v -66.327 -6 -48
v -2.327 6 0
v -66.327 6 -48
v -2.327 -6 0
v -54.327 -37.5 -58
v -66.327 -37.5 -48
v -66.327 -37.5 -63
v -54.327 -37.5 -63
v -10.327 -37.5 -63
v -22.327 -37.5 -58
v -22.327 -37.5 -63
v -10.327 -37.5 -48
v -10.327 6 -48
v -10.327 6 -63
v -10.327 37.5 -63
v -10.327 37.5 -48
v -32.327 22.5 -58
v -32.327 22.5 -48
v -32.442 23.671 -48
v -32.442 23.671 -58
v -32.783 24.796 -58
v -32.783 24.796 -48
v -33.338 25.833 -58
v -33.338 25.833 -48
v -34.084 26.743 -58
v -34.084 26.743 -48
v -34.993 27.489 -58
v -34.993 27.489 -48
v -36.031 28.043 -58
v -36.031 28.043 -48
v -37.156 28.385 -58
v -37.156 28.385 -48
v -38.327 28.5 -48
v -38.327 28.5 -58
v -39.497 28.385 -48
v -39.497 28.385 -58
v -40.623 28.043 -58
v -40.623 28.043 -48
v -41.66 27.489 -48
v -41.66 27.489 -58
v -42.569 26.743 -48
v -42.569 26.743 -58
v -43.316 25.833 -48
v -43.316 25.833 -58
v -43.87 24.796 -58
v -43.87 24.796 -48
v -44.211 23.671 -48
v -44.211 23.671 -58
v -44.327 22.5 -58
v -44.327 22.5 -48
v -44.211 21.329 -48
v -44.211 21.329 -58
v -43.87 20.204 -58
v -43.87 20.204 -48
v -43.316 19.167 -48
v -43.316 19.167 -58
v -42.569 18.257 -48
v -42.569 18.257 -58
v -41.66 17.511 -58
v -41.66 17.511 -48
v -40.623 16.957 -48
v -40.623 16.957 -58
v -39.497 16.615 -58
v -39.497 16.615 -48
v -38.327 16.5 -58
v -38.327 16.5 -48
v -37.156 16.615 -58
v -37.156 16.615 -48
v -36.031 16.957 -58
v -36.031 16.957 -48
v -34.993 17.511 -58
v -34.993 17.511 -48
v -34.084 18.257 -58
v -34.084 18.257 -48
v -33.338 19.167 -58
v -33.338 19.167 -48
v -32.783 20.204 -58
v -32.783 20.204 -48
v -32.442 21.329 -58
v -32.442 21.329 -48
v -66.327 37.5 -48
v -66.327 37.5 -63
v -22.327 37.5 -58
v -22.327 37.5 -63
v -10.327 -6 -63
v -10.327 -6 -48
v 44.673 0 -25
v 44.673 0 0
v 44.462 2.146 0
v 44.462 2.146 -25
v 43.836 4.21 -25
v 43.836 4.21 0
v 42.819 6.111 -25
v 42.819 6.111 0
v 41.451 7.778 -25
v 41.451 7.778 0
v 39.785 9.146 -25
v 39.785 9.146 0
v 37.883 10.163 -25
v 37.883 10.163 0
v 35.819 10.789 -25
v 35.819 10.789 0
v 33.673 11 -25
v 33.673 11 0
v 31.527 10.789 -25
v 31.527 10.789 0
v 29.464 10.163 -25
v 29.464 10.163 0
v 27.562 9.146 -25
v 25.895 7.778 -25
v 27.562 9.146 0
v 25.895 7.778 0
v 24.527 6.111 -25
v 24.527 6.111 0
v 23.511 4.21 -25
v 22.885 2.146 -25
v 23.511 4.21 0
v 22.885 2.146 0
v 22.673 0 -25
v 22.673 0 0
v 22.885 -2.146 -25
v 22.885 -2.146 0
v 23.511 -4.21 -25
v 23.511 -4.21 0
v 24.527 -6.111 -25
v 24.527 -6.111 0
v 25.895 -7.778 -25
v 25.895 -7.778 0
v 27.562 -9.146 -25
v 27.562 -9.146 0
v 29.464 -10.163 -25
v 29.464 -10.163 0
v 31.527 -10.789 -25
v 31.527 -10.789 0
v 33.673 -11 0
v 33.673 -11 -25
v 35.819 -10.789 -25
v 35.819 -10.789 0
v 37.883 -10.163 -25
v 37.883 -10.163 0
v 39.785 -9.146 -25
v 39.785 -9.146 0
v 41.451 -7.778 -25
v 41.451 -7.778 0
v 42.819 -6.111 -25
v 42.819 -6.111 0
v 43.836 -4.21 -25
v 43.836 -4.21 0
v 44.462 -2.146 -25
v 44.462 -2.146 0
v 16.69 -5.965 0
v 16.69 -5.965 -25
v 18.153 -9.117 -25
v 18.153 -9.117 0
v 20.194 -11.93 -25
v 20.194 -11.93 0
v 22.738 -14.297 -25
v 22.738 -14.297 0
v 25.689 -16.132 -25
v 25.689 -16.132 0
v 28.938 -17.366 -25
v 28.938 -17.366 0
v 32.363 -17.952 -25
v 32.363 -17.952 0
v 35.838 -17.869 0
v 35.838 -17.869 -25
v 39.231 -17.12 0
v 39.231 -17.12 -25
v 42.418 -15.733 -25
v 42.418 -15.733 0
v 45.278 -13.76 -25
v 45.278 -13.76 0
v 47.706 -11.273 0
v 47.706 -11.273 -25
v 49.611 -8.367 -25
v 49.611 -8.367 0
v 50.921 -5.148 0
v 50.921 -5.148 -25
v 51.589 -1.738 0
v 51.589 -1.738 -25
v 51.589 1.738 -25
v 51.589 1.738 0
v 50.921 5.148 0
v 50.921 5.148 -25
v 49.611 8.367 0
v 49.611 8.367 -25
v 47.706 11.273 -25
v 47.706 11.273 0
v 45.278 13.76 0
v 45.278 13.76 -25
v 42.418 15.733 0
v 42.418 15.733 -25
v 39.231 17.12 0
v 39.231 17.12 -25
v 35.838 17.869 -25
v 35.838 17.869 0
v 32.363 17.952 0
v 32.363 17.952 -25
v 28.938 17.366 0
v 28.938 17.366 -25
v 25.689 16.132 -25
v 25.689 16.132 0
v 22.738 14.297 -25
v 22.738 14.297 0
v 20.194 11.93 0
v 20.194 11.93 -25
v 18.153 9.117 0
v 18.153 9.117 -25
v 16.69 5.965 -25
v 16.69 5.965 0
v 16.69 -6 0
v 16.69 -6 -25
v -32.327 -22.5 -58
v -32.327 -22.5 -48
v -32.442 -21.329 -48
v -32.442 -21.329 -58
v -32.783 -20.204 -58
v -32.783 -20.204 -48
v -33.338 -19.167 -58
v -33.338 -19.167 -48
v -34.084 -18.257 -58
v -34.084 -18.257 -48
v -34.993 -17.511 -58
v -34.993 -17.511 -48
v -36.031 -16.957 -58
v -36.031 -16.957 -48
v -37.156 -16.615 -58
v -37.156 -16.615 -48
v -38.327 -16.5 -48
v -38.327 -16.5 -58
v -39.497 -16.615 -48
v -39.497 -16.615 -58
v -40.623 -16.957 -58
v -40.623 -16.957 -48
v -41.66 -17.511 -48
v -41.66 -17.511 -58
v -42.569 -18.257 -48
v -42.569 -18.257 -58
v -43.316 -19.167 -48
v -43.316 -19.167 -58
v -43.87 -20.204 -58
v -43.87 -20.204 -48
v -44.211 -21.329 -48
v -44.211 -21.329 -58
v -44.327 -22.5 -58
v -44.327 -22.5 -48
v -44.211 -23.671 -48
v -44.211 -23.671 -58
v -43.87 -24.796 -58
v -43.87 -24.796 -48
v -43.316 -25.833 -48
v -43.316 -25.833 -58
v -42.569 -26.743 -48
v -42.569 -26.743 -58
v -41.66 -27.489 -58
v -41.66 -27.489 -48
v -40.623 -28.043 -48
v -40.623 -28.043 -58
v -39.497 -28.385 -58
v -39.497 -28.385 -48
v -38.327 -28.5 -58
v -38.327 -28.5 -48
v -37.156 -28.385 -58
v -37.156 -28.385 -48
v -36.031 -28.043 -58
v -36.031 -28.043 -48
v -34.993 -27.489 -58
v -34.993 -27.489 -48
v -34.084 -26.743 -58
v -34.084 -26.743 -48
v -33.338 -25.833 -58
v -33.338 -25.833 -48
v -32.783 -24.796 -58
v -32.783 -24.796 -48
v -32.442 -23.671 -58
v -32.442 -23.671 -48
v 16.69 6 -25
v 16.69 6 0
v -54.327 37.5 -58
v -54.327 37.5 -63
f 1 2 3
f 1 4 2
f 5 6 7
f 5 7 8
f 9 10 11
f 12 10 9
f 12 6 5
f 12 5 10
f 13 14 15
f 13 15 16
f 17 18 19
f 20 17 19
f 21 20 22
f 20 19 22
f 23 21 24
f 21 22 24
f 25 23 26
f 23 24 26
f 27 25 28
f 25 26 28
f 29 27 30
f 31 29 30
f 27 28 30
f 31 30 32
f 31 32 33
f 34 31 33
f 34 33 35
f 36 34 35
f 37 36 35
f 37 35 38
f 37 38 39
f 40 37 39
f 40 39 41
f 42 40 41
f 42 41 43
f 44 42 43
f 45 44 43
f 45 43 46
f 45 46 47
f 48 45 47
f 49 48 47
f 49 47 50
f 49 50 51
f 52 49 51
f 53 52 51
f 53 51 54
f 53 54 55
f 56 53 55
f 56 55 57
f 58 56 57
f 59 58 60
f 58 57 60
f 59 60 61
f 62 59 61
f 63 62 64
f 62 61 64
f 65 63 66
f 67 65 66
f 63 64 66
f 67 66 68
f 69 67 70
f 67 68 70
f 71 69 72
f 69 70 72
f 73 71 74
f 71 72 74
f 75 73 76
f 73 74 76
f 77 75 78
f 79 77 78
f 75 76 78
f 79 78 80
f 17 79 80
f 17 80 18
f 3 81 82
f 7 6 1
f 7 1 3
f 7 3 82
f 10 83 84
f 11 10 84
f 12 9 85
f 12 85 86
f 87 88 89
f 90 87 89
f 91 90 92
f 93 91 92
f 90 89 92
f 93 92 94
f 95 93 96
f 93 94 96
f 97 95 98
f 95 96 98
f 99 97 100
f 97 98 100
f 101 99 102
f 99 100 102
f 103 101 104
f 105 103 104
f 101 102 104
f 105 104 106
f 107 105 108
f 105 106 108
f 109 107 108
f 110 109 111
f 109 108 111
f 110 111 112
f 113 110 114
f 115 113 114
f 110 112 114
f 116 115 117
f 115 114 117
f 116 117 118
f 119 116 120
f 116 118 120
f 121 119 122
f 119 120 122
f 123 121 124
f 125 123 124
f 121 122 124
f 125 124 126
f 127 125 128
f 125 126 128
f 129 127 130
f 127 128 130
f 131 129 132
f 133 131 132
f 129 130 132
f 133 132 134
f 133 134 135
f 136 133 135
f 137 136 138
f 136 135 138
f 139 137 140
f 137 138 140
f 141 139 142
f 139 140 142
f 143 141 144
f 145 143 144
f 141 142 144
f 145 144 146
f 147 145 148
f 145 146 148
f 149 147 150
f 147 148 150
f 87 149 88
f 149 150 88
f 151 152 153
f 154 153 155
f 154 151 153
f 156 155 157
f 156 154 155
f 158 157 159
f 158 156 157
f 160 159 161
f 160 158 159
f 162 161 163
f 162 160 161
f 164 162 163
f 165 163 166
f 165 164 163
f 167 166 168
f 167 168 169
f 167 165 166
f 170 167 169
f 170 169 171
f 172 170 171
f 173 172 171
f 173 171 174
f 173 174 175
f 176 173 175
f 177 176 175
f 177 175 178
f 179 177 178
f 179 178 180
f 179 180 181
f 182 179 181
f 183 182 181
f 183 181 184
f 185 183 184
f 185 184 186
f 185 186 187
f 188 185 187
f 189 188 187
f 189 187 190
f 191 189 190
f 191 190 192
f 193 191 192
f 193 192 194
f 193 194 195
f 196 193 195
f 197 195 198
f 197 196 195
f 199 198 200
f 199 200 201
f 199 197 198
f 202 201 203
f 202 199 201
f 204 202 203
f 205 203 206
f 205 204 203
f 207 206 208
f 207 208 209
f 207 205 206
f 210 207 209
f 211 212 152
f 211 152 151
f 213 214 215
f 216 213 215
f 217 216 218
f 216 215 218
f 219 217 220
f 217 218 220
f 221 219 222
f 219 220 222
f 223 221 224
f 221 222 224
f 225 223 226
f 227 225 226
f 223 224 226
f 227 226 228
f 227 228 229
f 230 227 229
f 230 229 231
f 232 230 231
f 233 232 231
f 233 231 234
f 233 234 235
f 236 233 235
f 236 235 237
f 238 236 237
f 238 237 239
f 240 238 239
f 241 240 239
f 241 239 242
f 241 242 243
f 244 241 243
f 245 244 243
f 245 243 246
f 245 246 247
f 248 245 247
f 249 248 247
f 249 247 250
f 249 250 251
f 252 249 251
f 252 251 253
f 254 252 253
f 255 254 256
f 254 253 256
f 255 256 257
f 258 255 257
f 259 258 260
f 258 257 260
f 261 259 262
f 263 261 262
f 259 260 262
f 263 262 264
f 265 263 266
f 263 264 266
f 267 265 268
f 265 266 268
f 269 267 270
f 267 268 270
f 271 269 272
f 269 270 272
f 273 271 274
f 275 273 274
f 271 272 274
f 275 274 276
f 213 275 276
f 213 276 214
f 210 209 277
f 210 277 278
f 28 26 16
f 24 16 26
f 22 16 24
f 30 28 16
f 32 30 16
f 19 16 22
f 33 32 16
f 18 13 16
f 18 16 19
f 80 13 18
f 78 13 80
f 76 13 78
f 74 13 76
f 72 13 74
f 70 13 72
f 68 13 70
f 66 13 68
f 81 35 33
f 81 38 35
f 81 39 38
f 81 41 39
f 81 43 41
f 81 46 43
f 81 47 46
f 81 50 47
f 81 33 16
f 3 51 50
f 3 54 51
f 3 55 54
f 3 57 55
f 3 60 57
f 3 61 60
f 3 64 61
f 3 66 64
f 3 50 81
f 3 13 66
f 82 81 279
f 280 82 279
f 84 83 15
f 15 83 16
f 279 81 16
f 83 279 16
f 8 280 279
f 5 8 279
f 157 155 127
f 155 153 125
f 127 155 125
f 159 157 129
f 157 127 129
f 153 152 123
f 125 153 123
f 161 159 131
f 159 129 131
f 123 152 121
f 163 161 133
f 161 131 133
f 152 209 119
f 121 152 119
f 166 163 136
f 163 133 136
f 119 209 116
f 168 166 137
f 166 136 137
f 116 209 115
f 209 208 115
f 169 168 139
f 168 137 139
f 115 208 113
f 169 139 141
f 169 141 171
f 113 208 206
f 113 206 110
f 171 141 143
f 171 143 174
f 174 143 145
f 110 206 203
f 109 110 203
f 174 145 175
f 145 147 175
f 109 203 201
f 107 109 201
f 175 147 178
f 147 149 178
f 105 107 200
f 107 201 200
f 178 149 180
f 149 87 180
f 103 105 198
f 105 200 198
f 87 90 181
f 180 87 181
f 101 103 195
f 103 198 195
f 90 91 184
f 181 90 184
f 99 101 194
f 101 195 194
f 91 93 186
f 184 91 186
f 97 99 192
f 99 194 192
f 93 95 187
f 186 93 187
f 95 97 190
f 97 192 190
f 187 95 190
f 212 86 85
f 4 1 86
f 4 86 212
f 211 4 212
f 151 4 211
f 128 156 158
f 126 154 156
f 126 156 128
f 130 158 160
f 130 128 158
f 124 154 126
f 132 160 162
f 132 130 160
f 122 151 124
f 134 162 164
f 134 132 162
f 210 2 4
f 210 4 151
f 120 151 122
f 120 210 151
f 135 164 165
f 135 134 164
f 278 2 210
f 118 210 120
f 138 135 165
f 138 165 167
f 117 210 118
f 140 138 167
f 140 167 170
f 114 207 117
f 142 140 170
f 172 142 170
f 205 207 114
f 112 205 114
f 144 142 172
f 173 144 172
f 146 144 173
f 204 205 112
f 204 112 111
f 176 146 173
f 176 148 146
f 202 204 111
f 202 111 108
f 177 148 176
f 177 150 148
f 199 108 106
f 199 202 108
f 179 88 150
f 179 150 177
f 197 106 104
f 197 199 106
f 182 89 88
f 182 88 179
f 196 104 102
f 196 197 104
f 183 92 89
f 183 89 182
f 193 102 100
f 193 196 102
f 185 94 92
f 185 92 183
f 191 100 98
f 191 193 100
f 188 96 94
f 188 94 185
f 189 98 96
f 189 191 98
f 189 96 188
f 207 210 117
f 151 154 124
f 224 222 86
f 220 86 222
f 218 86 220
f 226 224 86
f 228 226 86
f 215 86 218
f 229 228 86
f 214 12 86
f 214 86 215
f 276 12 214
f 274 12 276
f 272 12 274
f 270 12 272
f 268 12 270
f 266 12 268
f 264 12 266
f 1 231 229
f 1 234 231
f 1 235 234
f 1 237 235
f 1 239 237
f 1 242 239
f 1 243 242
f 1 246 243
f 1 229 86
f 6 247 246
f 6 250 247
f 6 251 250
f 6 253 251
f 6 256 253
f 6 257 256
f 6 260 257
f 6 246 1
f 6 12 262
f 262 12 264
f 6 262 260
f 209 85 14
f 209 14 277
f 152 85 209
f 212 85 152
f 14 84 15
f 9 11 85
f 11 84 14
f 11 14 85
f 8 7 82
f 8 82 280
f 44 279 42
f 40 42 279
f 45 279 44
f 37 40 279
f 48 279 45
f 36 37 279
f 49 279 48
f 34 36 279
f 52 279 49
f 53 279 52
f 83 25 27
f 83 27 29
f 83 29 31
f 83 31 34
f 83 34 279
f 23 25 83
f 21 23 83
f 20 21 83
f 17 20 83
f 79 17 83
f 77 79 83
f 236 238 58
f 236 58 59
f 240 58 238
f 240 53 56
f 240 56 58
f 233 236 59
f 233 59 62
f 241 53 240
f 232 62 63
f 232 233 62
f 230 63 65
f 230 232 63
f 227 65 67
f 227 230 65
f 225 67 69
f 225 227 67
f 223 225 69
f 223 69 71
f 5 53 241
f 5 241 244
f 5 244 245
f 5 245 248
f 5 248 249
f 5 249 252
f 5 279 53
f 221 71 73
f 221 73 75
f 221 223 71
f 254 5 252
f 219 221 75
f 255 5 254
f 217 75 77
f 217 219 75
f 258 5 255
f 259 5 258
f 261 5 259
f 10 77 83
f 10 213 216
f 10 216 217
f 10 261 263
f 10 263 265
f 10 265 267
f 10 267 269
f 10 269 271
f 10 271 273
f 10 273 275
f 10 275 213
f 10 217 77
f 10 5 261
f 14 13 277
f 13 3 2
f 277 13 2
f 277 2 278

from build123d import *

# Parameters (mm, degrees)
F2_DEPTH = 37.5
F3_DEPTH = 6
F0_R     = 18
F0_R_2   = 11
F4_DEPTH = 25
F0_R_3   = 6
F5_DEPTH = 63.001


with BuildPart() as f2:
    # F1 (on Front) → F2 (new body, symmetric)
    with BuildSketch(Plane.XZ):
        Polygon((-66.326725, -48), (-66.326725, -63), (-54.326725, -63), (-54.326725, -58), (-22.326725, -58), (-22.326725, -63), (-10.326725, -63), (-10.326725, -48), align=None)
    extrude(amount=F2_DEPTH, both=True)

    # F1 (on Front) → F3 (join, symmetric)
    with BuildSketch(Plane.XZ):
        Polygon((-2.326725, 0), (-66.326725, -48), (-10.326725, -48), (-10.326725, -63), (16.690247, -25), (16.690247, 0), align=None)
    extrude(amount=F3_DEPTH, both=True)

    # F0 (on Top) → F4 (join)
    with BuildSketch(Plane.XY):
        with Locations((33.673275, 0)):
            Circle(F0_R)
        with Locations((33.673275, 0)):
            Circle(F0_R_2, mode=Mode.SUBTRACT)
    extrude(amount=-F4_DEPTH)

    # F0 (on Top) → F5 (cut, through all)
    with BuildSketch(Plane.XY):
        with Locations((-38.326725, 22.5)):
            Circle(F0_R_3)
        with Locations((-38.326725, -22.5)):
            Circle(F0_R_3)
    extrude(amount=-F5_DEPTH, mode=Mode.SUBTRACT)


solid = f2.part
